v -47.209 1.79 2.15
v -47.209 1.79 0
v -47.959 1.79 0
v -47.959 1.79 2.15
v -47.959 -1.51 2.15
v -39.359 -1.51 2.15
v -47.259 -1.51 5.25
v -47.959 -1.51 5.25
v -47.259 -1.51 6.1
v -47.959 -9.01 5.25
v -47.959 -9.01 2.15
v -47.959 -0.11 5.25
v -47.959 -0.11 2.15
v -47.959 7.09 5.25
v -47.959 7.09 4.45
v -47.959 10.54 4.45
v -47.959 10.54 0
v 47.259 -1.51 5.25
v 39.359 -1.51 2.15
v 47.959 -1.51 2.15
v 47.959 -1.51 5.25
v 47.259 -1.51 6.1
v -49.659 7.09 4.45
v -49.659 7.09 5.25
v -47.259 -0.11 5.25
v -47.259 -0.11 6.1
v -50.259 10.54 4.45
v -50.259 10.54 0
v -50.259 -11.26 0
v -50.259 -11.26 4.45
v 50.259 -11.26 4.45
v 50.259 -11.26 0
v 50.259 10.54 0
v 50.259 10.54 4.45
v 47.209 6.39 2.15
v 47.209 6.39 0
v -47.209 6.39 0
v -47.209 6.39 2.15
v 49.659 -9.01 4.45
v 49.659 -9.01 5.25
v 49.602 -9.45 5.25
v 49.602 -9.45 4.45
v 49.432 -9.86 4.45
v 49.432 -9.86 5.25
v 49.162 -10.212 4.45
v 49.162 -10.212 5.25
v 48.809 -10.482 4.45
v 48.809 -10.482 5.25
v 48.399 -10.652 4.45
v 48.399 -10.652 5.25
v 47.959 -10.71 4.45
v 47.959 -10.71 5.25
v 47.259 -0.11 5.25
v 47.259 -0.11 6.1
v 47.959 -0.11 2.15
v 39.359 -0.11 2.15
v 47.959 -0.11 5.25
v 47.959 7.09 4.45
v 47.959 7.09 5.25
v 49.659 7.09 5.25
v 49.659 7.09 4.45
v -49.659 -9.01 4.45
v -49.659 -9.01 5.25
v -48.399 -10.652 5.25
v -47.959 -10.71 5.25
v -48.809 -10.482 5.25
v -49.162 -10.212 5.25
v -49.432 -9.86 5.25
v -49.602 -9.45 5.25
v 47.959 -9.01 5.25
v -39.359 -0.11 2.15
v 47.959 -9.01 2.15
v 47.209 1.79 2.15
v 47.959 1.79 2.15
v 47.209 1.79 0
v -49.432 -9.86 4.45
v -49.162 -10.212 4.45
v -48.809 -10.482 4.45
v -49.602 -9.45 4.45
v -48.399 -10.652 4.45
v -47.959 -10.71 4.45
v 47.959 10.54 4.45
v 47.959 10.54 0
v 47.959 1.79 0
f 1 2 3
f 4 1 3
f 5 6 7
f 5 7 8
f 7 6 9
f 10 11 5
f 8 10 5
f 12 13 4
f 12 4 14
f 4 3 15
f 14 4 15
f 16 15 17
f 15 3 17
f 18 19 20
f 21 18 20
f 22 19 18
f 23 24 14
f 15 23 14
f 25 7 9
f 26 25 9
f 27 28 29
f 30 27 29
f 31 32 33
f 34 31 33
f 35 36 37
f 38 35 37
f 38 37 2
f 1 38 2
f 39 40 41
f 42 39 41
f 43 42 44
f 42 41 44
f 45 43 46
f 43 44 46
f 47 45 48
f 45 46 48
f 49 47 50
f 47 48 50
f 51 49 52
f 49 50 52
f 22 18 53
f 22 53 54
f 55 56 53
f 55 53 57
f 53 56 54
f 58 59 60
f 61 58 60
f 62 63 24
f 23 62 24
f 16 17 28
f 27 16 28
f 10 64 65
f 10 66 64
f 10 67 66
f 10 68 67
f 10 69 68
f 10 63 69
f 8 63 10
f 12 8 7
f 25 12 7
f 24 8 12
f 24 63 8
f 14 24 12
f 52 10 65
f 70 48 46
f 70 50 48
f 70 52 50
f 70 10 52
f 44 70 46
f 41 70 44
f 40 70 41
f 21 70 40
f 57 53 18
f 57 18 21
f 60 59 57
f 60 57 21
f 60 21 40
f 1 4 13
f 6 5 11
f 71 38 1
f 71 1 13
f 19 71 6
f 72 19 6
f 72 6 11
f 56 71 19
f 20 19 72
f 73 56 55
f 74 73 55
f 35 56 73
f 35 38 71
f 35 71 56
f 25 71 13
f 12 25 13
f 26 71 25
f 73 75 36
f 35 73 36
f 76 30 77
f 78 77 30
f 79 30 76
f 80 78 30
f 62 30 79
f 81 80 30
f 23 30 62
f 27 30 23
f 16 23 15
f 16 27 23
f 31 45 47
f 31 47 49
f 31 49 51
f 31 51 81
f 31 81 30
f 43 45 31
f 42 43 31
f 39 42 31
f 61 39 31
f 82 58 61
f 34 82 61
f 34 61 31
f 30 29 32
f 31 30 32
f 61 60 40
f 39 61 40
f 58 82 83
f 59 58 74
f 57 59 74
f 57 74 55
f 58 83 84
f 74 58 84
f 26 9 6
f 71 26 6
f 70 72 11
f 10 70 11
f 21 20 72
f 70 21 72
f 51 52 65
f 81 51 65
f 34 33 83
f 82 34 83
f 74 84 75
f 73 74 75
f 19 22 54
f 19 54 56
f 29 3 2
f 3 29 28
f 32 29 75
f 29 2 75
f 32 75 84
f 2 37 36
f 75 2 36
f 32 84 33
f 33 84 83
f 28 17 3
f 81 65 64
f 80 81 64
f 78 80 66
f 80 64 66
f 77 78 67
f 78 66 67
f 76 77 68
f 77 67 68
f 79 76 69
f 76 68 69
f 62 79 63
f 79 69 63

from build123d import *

# Parameters (mm, degrees)
F1_DEPTH = 2.15
F3_DEPTH = 3.1
F5_DEPTH = 0.8
F9_DEPTH = 1.4


with BuildPart() as f1:
    # F0 (on Top) → F1 (new body)
    with BuildSketch(Plane.XY):
        Polygon((-50.2594385356, -11.2599956296), (0, -11.2599956296), (0, 6.3900043704), (-47.2094385356, 6.3900043704), (-47.2094385356, 1.7900043704), (-47.9594385356, 1.7900043704), (-47.9594385356, 10.5400043704), (-50.2594385356, 10.5400043704), align=None)
        Polygon((0, 6.3900043704), (0, -11.2599956296), (50.2594385356, -11.2599956296), (50.2594385356, 10.5400043704), (47.9594385356, 10.5400043704), (47.9594385356, 1.7900043704), (47.2094385356, 1.7900043704), (47.2094385356, 6.3900043704), align=None)
    extrude(amount=F1_DEPTH)

    # F2 (on face) → F3 (join)
    with BuildSketch(Plane.XY.offset(2.15)):
        Polygon((-47.9594385356, -9.0099956296), (-47.9594385356, 1.7900043704), (-47.9594385356, 10.5400043704), (-50.2594385356, 10.5400043704), (-50.2594385356, -11.2599956296), (50.2594385356, -11.2599956296), (50.2594385356, 10.5400043704), (47.9594385356, 10.5400043704), (47.9594385356, 1.7900043704), (47.9594385356, -9.0099956296), (0, -9.0099956296), align=None)
    extrude(amount=F3_DEPTH)

    # F4 (on face) → F5 (cut)
    with BuildSketch(Plane.XY.offset(5.25)):
        with BuildLine():
            Line((-49.6594385356, -9.0099956296), (-49.6594385356, 7.0900043704))
            Line((-49.6594385356, 7.0900043704), (-47.9594385356, 7.0900043704))
            Line((-47.9594385356, 7.0900043704), (-47.9594385356, 10.5400043704))
            Line((-47.9594385356, 10.5400043704), (-50.2594385356, 10.5400043704))
            Line((-50.2594385356, 10.5400043704), (-50.2594385356, -11.2599956296))
            Line((-50.2594385356, -11.2599956296), (50.2594385356, -11.2599956296))
            Line((50.2594385356, -11.2599956296), (50.2594385356, 10.5400043704))
            Line((50.2594385356, 10.5400043704), (47.9594385356, 10.5400043704))
            Line((47.9594385356, 10.5400043704), (47.9594385356, 7.0900043704))
            Line((47.9594385356, 7.0900043704), (49.6594385356, 7.0900043704))
            Line((49.6594385356, 7.0900043704), (49.6594385356, -9.0099956296))
            ThreePointArc((49.6594385356, -9.0099956296), (49.1615200636, -10.2120771576), (47.9594385356, -10.7099956296))
            Line((47.9594385356, -10.7099956296), (0, -10.7099956296))
            Line((0, -10.7099956296), (-47.9594385356, -10.7099956296))
            ThreePointArc((-47.9594385356, -10.7099956296), (-49.1615200636, -10.2120771576), (-49.6594385356, -9.0099956296))
        make_face()
    extrude(amount=-F5_DEPTH, mode=Mode.SUBTRACT)

    # F8 (on plane+point) → F9 (join)
    with BuildSketch(Plane(origin=(0, -1.5099956296, 0), x_dir=(-1, 0, 0), z_dir=(0, 1, 0))):
        Polygon((47.2594385356, 6.1), (39.3594385356, 2.15), (47.9594385356, 2.15), (47.9594385356, 5.25), (47.2594385356, 5.25), align=None)
    extrude(amount=F9_DEPTH)

    # F10: F1 across plane


with BuildPart() as f1_1:
    add(f1.part)
    add(f1.part.mirror(Plane.YZ))


solid = f1_1.part
